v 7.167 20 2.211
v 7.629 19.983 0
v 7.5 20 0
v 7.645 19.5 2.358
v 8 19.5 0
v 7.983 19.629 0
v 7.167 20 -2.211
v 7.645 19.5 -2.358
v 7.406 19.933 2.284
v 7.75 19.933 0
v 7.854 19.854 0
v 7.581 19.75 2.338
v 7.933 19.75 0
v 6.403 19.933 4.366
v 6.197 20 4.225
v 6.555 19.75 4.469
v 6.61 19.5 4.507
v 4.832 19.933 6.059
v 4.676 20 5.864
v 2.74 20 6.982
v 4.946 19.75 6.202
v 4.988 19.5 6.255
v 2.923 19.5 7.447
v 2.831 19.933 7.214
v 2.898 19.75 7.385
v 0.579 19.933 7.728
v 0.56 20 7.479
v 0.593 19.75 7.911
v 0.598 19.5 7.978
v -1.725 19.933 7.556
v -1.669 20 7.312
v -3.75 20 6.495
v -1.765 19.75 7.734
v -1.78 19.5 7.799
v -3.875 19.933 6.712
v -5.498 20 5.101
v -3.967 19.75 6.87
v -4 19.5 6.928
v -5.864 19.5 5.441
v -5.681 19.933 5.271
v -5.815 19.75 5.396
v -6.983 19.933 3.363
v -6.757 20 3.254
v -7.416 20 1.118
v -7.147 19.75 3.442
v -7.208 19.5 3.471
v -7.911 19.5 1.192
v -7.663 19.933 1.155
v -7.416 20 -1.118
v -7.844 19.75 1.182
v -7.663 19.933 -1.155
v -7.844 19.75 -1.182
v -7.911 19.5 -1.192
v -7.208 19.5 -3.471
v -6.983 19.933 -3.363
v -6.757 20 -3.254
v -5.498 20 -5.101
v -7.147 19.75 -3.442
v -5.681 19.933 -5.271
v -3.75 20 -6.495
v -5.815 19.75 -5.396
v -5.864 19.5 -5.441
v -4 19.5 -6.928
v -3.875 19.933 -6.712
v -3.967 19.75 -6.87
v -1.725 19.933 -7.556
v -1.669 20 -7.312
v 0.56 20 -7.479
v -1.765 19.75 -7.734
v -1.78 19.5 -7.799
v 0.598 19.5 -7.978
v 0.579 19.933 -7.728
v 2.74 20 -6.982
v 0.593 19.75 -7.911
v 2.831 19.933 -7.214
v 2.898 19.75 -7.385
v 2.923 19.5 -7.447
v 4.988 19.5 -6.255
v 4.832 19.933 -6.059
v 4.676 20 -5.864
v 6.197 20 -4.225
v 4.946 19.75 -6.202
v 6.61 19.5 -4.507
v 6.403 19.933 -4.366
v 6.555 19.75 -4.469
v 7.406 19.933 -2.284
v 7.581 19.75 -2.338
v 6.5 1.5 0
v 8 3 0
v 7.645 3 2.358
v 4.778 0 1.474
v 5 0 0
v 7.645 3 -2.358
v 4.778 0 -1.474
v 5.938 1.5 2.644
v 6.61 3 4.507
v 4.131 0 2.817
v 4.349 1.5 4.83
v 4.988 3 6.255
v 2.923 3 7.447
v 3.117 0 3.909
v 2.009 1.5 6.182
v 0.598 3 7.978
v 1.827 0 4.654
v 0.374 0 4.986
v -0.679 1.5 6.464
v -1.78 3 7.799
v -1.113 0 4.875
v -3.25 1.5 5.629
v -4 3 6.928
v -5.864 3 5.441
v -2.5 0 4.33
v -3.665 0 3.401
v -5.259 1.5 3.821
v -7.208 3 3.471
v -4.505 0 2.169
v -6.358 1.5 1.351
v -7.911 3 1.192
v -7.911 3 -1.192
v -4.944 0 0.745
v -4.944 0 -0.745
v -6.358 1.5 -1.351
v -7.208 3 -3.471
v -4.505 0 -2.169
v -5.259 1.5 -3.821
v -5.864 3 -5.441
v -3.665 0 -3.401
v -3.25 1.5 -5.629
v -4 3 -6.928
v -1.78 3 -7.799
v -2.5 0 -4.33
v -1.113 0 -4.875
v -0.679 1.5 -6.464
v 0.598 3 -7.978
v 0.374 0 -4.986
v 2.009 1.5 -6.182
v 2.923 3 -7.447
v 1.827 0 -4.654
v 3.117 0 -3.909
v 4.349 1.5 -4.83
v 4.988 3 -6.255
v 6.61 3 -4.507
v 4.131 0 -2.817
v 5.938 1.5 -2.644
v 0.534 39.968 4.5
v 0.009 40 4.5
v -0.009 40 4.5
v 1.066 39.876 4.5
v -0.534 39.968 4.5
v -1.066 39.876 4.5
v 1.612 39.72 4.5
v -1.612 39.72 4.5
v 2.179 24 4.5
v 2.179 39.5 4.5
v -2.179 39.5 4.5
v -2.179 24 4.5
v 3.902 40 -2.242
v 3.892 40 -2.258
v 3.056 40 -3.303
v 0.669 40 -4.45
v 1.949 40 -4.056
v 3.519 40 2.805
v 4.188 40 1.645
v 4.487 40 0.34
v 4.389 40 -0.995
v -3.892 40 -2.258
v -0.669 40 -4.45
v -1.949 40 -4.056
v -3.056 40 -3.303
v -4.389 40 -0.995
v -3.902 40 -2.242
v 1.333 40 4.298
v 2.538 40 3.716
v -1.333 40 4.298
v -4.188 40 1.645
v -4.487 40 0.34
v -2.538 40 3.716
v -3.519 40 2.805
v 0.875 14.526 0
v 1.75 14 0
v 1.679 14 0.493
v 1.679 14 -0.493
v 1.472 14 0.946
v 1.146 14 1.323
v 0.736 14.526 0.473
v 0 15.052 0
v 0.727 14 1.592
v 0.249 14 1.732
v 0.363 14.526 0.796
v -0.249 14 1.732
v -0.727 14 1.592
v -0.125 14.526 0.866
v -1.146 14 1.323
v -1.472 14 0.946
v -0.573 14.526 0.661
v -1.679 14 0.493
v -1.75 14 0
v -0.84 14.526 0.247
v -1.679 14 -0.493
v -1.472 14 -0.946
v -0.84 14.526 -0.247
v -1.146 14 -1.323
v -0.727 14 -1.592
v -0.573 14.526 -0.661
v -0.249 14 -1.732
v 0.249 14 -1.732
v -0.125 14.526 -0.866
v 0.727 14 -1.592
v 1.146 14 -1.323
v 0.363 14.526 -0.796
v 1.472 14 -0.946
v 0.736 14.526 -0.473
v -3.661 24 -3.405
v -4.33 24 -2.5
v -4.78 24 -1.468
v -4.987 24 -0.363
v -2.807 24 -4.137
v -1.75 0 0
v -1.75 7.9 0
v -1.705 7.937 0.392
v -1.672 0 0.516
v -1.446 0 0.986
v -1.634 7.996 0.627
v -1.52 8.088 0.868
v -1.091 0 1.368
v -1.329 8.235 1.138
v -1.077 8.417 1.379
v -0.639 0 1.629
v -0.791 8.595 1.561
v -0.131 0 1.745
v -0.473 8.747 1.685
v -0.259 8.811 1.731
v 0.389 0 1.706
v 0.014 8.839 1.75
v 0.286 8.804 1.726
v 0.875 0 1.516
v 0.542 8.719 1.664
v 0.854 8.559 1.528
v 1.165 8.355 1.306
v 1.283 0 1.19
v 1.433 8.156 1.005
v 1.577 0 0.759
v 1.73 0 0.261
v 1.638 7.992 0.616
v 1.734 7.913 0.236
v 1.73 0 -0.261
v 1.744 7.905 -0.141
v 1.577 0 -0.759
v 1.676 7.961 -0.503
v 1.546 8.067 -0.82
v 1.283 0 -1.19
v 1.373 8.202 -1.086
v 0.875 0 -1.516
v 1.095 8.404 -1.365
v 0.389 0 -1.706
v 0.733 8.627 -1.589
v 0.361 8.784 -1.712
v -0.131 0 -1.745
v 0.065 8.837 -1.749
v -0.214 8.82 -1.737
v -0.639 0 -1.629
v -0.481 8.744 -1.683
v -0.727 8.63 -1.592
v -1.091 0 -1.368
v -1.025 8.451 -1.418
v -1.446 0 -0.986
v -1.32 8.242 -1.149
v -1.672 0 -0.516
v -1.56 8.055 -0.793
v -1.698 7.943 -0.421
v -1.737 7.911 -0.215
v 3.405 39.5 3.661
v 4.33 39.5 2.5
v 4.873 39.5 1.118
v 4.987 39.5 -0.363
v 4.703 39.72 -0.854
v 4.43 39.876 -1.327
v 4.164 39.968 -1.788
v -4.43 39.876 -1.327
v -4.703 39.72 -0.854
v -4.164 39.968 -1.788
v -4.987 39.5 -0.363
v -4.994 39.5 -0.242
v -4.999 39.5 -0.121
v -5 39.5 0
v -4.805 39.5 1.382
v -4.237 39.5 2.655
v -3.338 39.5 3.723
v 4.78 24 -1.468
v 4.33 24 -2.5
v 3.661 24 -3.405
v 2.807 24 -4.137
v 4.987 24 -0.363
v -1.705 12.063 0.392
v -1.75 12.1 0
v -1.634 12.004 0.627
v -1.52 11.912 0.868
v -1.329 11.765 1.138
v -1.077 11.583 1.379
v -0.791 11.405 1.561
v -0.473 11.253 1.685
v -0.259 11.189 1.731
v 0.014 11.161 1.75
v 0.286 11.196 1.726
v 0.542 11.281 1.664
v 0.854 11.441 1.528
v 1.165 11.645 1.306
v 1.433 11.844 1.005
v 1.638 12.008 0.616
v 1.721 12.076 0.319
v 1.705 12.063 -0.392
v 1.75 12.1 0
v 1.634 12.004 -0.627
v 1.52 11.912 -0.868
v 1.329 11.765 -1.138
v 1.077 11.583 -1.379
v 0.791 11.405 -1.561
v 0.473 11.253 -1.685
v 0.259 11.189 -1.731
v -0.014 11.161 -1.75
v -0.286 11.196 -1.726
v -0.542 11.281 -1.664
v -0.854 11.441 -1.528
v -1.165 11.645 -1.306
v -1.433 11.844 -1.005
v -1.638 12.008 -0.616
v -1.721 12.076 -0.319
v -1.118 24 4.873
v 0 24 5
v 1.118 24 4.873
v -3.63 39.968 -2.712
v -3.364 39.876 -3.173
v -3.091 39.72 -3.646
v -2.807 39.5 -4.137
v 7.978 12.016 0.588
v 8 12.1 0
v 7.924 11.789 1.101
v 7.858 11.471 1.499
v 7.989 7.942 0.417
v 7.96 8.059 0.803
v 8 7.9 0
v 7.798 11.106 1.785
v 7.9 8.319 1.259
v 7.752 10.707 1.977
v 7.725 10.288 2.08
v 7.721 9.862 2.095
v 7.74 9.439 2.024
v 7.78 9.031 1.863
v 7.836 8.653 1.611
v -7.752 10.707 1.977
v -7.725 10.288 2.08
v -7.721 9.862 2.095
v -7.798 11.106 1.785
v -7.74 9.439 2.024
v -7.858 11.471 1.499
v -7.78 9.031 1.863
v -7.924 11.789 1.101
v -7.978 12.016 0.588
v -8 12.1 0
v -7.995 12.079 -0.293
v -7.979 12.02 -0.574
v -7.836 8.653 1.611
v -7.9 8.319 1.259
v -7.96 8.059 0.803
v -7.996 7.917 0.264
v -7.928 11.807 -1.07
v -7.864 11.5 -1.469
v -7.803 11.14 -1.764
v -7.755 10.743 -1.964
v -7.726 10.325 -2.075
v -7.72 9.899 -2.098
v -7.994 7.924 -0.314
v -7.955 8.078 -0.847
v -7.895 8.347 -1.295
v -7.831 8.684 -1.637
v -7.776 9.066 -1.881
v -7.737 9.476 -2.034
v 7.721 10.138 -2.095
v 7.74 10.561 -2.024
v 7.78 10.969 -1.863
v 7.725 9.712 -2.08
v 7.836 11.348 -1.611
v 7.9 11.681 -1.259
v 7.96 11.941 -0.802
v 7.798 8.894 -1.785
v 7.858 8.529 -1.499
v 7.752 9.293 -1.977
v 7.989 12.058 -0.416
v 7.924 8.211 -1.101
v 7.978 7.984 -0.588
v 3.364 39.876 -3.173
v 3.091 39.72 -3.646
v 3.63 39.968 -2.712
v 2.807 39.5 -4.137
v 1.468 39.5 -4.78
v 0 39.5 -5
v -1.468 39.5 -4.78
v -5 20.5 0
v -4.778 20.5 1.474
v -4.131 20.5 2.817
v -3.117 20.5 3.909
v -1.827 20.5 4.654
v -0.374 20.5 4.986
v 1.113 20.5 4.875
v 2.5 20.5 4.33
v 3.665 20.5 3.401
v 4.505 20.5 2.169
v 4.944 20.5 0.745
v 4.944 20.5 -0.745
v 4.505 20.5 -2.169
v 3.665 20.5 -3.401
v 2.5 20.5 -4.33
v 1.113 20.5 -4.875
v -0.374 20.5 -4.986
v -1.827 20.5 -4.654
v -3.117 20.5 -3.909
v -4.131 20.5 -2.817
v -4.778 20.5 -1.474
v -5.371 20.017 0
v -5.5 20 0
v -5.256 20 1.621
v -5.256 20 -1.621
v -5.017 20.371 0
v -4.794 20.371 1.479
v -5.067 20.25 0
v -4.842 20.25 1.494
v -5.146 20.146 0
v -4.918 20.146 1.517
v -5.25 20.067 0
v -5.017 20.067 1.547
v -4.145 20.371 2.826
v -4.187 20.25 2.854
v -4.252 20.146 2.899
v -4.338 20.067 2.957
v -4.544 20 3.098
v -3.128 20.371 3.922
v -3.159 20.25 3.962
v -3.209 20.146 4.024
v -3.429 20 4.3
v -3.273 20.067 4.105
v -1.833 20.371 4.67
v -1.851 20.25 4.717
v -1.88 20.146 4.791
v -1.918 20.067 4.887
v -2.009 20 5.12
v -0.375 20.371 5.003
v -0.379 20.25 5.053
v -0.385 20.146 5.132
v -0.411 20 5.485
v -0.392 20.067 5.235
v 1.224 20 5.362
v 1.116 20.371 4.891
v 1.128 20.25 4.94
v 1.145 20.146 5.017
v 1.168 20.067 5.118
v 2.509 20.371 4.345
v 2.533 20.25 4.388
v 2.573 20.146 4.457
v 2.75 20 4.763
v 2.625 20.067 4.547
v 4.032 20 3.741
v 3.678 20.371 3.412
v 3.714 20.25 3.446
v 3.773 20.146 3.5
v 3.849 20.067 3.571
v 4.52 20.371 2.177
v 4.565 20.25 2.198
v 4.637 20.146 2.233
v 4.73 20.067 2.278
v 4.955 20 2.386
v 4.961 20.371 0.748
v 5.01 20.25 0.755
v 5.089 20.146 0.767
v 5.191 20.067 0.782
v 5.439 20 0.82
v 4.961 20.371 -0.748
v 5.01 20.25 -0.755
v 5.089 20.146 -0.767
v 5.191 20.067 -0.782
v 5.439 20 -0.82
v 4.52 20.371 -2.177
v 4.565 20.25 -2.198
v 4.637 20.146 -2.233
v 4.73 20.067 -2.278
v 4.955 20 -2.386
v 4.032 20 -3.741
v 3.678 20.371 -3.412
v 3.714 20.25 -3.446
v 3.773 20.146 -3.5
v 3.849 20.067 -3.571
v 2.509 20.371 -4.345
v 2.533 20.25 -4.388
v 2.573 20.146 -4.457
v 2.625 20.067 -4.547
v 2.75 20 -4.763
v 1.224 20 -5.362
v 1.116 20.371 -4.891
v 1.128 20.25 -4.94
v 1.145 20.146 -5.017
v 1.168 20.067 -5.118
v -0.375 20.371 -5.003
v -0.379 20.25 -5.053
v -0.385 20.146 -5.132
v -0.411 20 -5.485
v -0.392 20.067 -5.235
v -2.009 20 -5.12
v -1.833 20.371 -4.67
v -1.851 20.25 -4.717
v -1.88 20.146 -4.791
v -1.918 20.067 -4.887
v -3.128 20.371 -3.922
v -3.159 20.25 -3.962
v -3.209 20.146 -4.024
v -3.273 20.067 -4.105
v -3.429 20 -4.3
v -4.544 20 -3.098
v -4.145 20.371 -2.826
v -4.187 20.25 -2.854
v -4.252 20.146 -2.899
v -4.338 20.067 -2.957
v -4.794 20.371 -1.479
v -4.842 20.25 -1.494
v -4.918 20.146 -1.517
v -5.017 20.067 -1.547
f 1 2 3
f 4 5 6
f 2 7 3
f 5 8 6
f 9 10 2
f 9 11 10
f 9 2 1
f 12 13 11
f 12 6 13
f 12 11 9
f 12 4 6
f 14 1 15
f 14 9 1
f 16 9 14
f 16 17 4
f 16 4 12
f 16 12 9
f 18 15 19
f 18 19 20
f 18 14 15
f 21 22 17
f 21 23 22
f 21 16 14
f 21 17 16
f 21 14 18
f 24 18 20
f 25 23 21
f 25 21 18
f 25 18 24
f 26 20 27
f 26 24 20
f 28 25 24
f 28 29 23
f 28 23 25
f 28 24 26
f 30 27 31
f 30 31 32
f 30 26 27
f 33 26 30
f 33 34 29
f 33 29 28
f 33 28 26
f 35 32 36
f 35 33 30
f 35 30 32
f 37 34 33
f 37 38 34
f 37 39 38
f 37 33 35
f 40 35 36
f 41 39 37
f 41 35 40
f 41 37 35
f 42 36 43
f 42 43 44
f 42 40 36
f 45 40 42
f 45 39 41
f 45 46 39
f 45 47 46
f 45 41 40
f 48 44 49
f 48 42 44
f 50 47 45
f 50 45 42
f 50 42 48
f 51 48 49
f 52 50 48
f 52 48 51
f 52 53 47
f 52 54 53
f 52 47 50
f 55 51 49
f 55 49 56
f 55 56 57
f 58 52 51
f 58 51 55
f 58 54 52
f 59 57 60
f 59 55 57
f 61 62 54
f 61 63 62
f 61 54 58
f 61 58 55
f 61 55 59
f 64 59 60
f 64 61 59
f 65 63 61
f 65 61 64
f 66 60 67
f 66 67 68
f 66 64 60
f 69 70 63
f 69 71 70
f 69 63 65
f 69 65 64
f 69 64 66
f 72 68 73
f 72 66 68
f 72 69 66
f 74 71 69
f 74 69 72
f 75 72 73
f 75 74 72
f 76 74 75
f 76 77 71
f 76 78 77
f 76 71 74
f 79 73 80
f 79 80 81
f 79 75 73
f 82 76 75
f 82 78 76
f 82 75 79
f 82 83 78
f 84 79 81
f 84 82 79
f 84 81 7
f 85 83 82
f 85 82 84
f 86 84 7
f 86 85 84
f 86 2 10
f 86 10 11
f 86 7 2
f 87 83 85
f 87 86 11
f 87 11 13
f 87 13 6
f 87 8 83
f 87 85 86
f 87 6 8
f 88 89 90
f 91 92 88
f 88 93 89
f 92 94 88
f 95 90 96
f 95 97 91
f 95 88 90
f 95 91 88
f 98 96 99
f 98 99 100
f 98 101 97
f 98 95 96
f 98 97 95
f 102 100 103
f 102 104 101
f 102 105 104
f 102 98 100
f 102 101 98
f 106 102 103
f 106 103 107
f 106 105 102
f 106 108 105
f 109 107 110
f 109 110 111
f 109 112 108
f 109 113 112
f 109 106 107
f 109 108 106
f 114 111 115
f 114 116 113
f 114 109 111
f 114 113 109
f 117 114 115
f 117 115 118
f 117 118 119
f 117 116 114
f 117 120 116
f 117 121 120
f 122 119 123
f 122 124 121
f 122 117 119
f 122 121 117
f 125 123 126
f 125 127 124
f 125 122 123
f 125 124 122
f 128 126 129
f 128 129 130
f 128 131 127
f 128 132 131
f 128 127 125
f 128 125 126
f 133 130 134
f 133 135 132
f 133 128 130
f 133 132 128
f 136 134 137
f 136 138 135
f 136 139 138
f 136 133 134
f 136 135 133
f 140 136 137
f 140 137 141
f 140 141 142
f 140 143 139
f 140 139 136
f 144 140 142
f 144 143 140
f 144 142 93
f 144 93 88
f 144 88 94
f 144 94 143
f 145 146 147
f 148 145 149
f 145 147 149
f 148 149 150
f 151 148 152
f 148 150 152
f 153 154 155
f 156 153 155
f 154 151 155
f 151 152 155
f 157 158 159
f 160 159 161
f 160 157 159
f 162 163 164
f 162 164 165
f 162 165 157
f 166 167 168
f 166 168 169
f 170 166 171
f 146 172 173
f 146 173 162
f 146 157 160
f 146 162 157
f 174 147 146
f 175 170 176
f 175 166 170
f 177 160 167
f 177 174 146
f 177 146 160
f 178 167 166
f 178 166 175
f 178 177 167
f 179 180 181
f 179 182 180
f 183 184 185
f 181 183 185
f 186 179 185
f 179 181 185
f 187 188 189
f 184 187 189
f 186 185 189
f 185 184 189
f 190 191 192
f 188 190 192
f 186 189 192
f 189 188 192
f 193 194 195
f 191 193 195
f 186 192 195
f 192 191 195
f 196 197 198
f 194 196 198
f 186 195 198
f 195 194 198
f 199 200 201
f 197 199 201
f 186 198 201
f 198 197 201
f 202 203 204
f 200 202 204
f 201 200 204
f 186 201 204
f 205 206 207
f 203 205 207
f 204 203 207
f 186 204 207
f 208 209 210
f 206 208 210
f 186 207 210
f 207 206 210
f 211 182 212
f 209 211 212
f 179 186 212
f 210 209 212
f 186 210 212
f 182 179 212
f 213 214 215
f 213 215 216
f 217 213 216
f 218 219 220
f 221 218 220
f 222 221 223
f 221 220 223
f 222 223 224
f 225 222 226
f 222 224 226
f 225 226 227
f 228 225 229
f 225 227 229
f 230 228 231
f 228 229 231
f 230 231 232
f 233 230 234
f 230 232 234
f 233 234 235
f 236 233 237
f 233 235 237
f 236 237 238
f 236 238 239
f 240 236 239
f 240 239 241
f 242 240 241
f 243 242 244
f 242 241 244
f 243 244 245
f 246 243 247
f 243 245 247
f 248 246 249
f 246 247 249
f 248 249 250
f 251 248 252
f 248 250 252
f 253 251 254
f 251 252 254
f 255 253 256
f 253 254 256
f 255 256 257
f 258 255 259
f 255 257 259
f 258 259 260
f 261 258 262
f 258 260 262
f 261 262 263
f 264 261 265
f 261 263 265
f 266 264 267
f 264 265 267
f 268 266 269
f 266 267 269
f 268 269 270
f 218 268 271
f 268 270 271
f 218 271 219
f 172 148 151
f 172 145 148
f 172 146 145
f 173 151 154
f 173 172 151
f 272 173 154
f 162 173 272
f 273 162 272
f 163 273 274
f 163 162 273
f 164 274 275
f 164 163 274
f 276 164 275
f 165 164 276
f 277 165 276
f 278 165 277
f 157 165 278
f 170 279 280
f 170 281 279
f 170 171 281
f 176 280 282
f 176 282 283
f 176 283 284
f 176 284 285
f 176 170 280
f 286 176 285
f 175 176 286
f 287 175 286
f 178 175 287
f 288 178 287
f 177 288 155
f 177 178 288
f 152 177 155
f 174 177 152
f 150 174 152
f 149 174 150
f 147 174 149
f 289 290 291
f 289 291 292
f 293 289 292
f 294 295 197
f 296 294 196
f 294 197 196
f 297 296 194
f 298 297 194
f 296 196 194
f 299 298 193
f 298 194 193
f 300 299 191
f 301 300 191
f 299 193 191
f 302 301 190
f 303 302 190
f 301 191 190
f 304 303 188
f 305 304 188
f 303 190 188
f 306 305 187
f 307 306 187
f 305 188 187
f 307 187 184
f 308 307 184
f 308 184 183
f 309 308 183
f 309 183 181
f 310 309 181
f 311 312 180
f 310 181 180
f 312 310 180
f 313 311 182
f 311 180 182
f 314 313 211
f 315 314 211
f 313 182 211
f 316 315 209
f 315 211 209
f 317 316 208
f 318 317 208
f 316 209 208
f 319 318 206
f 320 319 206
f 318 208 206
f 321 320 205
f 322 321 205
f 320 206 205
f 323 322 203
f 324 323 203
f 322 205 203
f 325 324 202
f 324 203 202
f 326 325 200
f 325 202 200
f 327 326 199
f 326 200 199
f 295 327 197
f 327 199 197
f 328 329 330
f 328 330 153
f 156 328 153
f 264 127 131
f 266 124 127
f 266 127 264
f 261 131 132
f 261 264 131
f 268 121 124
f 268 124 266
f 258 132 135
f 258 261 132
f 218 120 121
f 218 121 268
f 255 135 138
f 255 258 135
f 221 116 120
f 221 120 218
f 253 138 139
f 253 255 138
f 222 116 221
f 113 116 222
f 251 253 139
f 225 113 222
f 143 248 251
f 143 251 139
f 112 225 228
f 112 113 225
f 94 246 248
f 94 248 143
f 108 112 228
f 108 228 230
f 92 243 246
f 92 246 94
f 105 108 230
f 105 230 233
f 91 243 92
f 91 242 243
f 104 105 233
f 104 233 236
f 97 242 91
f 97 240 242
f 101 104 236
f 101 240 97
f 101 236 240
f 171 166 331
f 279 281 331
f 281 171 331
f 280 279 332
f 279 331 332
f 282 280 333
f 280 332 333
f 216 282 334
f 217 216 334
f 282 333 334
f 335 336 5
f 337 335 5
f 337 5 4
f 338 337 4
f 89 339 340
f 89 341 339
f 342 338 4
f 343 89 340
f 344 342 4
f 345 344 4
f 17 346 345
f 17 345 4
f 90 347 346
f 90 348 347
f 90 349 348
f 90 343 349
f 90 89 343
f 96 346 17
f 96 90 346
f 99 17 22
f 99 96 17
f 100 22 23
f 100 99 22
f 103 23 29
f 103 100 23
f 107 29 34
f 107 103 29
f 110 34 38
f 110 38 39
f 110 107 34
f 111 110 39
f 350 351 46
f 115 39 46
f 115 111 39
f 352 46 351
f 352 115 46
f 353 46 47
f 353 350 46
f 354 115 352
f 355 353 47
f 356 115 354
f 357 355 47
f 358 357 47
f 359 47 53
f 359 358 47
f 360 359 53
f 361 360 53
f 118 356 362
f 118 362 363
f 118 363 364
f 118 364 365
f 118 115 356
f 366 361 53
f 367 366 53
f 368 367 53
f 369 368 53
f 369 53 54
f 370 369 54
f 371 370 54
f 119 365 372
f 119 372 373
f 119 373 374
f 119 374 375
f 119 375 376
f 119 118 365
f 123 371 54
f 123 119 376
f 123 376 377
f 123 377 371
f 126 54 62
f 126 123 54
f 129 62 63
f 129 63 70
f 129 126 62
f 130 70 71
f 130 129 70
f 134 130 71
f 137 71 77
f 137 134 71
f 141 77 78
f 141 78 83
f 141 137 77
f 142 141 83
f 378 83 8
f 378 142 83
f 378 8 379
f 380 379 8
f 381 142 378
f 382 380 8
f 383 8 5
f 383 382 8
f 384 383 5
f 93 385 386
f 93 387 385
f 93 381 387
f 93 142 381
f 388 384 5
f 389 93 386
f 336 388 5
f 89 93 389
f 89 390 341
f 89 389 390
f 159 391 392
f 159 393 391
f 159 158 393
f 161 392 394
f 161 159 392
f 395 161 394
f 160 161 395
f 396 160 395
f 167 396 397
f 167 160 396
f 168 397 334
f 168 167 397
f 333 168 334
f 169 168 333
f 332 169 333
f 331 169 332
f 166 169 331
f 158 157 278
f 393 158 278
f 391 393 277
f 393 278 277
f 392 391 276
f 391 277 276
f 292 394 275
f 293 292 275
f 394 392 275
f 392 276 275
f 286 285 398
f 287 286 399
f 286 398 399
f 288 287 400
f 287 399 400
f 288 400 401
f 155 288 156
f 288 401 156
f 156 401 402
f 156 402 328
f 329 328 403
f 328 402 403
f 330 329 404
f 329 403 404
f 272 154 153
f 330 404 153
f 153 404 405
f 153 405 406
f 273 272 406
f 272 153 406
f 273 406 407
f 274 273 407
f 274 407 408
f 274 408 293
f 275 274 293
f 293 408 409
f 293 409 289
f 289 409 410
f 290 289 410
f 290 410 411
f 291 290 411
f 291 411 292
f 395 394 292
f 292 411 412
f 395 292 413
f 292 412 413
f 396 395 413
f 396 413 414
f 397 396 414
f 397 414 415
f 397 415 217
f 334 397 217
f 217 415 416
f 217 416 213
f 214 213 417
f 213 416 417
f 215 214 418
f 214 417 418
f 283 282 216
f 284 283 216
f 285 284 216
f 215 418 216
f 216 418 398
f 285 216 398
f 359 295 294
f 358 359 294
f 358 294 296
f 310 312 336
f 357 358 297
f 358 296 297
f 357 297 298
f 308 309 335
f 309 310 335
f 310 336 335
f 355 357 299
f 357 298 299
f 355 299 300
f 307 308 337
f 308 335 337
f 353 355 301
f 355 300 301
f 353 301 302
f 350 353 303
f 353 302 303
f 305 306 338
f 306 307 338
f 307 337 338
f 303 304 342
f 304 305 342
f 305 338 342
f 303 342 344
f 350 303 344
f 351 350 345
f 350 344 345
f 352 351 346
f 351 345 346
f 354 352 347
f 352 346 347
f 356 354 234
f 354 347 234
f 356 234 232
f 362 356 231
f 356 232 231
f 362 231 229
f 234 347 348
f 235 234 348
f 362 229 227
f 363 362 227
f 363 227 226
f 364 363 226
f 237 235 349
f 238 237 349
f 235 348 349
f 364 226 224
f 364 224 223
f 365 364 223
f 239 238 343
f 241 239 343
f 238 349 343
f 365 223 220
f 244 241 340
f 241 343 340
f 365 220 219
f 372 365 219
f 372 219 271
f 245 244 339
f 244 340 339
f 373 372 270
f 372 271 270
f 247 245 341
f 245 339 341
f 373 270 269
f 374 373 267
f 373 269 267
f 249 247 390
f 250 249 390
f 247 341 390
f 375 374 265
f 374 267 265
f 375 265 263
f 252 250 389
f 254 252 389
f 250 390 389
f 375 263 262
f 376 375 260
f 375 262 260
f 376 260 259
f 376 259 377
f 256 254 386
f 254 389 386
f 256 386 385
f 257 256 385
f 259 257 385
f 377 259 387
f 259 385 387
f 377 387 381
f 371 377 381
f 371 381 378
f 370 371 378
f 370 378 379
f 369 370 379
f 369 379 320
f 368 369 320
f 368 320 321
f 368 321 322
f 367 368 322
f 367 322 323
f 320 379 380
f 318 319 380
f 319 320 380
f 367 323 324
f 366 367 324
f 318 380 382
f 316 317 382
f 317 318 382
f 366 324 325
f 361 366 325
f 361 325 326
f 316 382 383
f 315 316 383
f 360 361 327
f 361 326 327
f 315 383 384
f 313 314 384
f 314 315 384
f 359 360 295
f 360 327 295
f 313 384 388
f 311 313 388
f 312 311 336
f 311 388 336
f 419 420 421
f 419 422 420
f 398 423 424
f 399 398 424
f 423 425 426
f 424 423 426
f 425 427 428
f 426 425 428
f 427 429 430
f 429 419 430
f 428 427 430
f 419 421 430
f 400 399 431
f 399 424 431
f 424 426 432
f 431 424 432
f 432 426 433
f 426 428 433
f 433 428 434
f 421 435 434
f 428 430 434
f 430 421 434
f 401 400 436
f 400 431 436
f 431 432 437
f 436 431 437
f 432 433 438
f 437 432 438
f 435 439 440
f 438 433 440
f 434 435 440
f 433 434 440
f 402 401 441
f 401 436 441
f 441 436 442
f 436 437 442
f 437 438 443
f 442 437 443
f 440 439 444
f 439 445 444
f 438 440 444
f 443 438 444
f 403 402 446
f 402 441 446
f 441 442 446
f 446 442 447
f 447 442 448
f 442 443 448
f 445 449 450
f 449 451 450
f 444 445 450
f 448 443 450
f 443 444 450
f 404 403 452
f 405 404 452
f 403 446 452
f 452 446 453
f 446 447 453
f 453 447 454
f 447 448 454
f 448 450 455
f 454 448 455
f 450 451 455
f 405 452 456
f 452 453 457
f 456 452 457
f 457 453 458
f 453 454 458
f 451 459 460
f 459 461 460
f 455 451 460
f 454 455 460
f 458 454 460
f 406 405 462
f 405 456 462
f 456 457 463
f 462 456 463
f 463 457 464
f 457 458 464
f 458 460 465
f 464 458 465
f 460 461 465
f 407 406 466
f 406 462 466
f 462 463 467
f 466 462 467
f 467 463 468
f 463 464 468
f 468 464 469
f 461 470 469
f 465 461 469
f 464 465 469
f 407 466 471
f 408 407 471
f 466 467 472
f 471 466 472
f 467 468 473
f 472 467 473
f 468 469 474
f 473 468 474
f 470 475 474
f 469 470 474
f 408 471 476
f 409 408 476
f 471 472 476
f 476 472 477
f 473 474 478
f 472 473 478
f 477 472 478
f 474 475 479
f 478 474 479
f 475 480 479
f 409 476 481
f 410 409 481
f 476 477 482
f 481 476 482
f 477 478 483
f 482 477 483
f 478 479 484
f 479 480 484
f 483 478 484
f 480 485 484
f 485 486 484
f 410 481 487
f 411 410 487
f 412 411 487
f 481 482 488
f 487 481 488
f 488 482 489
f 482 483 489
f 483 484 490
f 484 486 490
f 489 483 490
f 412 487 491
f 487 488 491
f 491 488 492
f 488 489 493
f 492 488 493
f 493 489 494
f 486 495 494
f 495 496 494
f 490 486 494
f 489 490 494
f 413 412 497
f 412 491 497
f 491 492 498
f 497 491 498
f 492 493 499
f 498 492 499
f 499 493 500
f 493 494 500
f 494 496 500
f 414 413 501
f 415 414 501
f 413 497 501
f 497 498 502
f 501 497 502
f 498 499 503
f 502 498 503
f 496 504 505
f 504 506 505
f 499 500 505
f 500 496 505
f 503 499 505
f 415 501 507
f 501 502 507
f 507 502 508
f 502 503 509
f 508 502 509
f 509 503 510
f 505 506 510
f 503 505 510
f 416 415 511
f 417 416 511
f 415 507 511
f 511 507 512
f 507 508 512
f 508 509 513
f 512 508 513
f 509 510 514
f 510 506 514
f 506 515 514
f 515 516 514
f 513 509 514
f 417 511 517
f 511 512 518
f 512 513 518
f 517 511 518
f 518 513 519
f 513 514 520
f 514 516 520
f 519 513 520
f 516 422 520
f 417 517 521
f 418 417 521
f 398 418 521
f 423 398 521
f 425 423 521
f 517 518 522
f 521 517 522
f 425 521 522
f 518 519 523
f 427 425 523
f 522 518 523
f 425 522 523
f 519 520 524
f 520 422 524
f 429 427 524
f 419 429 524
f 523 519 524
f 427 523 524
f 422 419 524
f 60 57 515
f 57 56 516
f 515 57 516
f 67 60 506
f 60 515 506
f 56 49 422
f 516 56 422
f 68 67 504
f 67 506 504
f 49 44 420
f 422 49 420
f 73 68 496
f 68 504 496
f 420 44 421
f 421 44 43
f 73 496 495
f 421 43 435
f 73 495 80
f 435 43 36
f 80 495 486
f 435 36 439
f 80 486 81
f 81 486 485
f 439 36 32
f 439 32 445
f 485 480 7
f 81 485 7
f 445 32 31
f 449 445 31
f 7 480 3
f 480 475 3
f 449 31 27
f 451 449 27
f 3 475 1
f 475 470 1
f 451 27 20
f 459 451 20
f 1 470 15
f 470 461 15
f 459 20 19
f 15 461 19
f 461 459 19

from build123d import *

# Parameters (mm, degrees)
F0_R            = 8
F1_DEPTH        = 20
F2_R            = 5
F3_DEPTH        = 20
F5_DEPTH        = 16
F5_COPIES_COUNT = 3
F6_SIZE         = 0.49999
F7_R            = 0.5
F9_D            = 3.5
F9_DEPTH        = 14
F9_TIP          = 1.0515060833
F10_R           = 2.1
F11_DEPTH       = 8.25
F12_SIZE        = 3


# Not quite as in the source:
# - a fillet or chamfer is up to 0.001 mm smaller than in the source, because OpenCascade refuses the exact size
# - a pattern or mirror of a feature is missing from the dataset's text; its kind, count and spacing are read off the source's solid


with BuildPart() as f1:
    # F0 (on Front) → F1 (new body)
    with BuildSketch(Plane.XZ):
        Circle(F0_R)
    extrude(amount=-F1_DEPTH)

    # F2 (on face) → F3 (join)
    with BuildSketch(Plane(origin=(0, 20, 0), x_dir=(-1, 0, 0), z_dir=(0, 1, 0))):
        Circle(F2_R)
    extrude(amount=F3_DEPTH)

    # F4 (on face) → F5 (cut)
    with BuildSketch(Plane(origin=(0, 40, 0), x_dir=(-1, 0, 0), z_dir=(0, 1, 0))):
        with BuildLine():
            ThreePointArc((2.1794494718, 4.5), (0, 5), (-2.1794494718, 4.5))
            Line((-2.1794494718, 4.5), (2.1794494718, 4.5))
        make_face()
    f5 = extrude(amount=-F5_DEPTH, mode=Mode.SUBTRACT)

    # F5_copies: F5 ×3 about axis
    f5_copies_axis = Axis((0, 0, 0), (0, 1, 0))
    for i in range(1, F5_COPIES_COUNT):
        add(f5.rotate(f5_copies_axis, i * 360 / F5_COPIES_COUNT), mode=Mode.SUBTRACT)

    # F6 (size 0.5 in the source; OpenCascade refuses exactly that, so slightly less here)
    f6_edges = [f1.edges().sort_by_distance(p)[0] for p in [
        (4.330127, 40, 2.5),
        (-4.996709, 40, -0.18139),
        (0, 40, -5),
        (-4.236582, 40, 2.655443),
    ]]
    chamfer(f6_edges, length=F6_SIZE)

    # F7
    f7_edges = [f1.edges().sort_by_distance(p)[0] for p in [
        (-8, 20, 0),
        (5, 20, 0),
    ]]
    fillet(f7_edges, radius=F7_R)

    # F9
    with Locations(Plane.XZ):
        with Locations((0, 0)):
            Hole(F9_D / 2, depth=F9_DEPTH)
            with Locations((0, 0, -(F9_DEPTH + F9_TIP / 2))):  # 118° drill point
                Cone(0, F9_D / 2, F9_TIP, mode=Mode.SUBTRACT)

    # F10 (on Right) → F11 (cut, symmetric)
    with BuildSketch(Plane.YZ):
        with Locations((10, 0)):
            Circle(F10_R)
    extrude(amount=F11_DEPTH, both=True, mode=Mode.SUBTRACT)

    # F12
    f12_edges = [f1.edges().sort_by_distance(p)[0] for p in [
        (-8, 0, 0),
    ]]
    chamfer(f12_edges, length=F12_SIZE)


solid = f1.part
